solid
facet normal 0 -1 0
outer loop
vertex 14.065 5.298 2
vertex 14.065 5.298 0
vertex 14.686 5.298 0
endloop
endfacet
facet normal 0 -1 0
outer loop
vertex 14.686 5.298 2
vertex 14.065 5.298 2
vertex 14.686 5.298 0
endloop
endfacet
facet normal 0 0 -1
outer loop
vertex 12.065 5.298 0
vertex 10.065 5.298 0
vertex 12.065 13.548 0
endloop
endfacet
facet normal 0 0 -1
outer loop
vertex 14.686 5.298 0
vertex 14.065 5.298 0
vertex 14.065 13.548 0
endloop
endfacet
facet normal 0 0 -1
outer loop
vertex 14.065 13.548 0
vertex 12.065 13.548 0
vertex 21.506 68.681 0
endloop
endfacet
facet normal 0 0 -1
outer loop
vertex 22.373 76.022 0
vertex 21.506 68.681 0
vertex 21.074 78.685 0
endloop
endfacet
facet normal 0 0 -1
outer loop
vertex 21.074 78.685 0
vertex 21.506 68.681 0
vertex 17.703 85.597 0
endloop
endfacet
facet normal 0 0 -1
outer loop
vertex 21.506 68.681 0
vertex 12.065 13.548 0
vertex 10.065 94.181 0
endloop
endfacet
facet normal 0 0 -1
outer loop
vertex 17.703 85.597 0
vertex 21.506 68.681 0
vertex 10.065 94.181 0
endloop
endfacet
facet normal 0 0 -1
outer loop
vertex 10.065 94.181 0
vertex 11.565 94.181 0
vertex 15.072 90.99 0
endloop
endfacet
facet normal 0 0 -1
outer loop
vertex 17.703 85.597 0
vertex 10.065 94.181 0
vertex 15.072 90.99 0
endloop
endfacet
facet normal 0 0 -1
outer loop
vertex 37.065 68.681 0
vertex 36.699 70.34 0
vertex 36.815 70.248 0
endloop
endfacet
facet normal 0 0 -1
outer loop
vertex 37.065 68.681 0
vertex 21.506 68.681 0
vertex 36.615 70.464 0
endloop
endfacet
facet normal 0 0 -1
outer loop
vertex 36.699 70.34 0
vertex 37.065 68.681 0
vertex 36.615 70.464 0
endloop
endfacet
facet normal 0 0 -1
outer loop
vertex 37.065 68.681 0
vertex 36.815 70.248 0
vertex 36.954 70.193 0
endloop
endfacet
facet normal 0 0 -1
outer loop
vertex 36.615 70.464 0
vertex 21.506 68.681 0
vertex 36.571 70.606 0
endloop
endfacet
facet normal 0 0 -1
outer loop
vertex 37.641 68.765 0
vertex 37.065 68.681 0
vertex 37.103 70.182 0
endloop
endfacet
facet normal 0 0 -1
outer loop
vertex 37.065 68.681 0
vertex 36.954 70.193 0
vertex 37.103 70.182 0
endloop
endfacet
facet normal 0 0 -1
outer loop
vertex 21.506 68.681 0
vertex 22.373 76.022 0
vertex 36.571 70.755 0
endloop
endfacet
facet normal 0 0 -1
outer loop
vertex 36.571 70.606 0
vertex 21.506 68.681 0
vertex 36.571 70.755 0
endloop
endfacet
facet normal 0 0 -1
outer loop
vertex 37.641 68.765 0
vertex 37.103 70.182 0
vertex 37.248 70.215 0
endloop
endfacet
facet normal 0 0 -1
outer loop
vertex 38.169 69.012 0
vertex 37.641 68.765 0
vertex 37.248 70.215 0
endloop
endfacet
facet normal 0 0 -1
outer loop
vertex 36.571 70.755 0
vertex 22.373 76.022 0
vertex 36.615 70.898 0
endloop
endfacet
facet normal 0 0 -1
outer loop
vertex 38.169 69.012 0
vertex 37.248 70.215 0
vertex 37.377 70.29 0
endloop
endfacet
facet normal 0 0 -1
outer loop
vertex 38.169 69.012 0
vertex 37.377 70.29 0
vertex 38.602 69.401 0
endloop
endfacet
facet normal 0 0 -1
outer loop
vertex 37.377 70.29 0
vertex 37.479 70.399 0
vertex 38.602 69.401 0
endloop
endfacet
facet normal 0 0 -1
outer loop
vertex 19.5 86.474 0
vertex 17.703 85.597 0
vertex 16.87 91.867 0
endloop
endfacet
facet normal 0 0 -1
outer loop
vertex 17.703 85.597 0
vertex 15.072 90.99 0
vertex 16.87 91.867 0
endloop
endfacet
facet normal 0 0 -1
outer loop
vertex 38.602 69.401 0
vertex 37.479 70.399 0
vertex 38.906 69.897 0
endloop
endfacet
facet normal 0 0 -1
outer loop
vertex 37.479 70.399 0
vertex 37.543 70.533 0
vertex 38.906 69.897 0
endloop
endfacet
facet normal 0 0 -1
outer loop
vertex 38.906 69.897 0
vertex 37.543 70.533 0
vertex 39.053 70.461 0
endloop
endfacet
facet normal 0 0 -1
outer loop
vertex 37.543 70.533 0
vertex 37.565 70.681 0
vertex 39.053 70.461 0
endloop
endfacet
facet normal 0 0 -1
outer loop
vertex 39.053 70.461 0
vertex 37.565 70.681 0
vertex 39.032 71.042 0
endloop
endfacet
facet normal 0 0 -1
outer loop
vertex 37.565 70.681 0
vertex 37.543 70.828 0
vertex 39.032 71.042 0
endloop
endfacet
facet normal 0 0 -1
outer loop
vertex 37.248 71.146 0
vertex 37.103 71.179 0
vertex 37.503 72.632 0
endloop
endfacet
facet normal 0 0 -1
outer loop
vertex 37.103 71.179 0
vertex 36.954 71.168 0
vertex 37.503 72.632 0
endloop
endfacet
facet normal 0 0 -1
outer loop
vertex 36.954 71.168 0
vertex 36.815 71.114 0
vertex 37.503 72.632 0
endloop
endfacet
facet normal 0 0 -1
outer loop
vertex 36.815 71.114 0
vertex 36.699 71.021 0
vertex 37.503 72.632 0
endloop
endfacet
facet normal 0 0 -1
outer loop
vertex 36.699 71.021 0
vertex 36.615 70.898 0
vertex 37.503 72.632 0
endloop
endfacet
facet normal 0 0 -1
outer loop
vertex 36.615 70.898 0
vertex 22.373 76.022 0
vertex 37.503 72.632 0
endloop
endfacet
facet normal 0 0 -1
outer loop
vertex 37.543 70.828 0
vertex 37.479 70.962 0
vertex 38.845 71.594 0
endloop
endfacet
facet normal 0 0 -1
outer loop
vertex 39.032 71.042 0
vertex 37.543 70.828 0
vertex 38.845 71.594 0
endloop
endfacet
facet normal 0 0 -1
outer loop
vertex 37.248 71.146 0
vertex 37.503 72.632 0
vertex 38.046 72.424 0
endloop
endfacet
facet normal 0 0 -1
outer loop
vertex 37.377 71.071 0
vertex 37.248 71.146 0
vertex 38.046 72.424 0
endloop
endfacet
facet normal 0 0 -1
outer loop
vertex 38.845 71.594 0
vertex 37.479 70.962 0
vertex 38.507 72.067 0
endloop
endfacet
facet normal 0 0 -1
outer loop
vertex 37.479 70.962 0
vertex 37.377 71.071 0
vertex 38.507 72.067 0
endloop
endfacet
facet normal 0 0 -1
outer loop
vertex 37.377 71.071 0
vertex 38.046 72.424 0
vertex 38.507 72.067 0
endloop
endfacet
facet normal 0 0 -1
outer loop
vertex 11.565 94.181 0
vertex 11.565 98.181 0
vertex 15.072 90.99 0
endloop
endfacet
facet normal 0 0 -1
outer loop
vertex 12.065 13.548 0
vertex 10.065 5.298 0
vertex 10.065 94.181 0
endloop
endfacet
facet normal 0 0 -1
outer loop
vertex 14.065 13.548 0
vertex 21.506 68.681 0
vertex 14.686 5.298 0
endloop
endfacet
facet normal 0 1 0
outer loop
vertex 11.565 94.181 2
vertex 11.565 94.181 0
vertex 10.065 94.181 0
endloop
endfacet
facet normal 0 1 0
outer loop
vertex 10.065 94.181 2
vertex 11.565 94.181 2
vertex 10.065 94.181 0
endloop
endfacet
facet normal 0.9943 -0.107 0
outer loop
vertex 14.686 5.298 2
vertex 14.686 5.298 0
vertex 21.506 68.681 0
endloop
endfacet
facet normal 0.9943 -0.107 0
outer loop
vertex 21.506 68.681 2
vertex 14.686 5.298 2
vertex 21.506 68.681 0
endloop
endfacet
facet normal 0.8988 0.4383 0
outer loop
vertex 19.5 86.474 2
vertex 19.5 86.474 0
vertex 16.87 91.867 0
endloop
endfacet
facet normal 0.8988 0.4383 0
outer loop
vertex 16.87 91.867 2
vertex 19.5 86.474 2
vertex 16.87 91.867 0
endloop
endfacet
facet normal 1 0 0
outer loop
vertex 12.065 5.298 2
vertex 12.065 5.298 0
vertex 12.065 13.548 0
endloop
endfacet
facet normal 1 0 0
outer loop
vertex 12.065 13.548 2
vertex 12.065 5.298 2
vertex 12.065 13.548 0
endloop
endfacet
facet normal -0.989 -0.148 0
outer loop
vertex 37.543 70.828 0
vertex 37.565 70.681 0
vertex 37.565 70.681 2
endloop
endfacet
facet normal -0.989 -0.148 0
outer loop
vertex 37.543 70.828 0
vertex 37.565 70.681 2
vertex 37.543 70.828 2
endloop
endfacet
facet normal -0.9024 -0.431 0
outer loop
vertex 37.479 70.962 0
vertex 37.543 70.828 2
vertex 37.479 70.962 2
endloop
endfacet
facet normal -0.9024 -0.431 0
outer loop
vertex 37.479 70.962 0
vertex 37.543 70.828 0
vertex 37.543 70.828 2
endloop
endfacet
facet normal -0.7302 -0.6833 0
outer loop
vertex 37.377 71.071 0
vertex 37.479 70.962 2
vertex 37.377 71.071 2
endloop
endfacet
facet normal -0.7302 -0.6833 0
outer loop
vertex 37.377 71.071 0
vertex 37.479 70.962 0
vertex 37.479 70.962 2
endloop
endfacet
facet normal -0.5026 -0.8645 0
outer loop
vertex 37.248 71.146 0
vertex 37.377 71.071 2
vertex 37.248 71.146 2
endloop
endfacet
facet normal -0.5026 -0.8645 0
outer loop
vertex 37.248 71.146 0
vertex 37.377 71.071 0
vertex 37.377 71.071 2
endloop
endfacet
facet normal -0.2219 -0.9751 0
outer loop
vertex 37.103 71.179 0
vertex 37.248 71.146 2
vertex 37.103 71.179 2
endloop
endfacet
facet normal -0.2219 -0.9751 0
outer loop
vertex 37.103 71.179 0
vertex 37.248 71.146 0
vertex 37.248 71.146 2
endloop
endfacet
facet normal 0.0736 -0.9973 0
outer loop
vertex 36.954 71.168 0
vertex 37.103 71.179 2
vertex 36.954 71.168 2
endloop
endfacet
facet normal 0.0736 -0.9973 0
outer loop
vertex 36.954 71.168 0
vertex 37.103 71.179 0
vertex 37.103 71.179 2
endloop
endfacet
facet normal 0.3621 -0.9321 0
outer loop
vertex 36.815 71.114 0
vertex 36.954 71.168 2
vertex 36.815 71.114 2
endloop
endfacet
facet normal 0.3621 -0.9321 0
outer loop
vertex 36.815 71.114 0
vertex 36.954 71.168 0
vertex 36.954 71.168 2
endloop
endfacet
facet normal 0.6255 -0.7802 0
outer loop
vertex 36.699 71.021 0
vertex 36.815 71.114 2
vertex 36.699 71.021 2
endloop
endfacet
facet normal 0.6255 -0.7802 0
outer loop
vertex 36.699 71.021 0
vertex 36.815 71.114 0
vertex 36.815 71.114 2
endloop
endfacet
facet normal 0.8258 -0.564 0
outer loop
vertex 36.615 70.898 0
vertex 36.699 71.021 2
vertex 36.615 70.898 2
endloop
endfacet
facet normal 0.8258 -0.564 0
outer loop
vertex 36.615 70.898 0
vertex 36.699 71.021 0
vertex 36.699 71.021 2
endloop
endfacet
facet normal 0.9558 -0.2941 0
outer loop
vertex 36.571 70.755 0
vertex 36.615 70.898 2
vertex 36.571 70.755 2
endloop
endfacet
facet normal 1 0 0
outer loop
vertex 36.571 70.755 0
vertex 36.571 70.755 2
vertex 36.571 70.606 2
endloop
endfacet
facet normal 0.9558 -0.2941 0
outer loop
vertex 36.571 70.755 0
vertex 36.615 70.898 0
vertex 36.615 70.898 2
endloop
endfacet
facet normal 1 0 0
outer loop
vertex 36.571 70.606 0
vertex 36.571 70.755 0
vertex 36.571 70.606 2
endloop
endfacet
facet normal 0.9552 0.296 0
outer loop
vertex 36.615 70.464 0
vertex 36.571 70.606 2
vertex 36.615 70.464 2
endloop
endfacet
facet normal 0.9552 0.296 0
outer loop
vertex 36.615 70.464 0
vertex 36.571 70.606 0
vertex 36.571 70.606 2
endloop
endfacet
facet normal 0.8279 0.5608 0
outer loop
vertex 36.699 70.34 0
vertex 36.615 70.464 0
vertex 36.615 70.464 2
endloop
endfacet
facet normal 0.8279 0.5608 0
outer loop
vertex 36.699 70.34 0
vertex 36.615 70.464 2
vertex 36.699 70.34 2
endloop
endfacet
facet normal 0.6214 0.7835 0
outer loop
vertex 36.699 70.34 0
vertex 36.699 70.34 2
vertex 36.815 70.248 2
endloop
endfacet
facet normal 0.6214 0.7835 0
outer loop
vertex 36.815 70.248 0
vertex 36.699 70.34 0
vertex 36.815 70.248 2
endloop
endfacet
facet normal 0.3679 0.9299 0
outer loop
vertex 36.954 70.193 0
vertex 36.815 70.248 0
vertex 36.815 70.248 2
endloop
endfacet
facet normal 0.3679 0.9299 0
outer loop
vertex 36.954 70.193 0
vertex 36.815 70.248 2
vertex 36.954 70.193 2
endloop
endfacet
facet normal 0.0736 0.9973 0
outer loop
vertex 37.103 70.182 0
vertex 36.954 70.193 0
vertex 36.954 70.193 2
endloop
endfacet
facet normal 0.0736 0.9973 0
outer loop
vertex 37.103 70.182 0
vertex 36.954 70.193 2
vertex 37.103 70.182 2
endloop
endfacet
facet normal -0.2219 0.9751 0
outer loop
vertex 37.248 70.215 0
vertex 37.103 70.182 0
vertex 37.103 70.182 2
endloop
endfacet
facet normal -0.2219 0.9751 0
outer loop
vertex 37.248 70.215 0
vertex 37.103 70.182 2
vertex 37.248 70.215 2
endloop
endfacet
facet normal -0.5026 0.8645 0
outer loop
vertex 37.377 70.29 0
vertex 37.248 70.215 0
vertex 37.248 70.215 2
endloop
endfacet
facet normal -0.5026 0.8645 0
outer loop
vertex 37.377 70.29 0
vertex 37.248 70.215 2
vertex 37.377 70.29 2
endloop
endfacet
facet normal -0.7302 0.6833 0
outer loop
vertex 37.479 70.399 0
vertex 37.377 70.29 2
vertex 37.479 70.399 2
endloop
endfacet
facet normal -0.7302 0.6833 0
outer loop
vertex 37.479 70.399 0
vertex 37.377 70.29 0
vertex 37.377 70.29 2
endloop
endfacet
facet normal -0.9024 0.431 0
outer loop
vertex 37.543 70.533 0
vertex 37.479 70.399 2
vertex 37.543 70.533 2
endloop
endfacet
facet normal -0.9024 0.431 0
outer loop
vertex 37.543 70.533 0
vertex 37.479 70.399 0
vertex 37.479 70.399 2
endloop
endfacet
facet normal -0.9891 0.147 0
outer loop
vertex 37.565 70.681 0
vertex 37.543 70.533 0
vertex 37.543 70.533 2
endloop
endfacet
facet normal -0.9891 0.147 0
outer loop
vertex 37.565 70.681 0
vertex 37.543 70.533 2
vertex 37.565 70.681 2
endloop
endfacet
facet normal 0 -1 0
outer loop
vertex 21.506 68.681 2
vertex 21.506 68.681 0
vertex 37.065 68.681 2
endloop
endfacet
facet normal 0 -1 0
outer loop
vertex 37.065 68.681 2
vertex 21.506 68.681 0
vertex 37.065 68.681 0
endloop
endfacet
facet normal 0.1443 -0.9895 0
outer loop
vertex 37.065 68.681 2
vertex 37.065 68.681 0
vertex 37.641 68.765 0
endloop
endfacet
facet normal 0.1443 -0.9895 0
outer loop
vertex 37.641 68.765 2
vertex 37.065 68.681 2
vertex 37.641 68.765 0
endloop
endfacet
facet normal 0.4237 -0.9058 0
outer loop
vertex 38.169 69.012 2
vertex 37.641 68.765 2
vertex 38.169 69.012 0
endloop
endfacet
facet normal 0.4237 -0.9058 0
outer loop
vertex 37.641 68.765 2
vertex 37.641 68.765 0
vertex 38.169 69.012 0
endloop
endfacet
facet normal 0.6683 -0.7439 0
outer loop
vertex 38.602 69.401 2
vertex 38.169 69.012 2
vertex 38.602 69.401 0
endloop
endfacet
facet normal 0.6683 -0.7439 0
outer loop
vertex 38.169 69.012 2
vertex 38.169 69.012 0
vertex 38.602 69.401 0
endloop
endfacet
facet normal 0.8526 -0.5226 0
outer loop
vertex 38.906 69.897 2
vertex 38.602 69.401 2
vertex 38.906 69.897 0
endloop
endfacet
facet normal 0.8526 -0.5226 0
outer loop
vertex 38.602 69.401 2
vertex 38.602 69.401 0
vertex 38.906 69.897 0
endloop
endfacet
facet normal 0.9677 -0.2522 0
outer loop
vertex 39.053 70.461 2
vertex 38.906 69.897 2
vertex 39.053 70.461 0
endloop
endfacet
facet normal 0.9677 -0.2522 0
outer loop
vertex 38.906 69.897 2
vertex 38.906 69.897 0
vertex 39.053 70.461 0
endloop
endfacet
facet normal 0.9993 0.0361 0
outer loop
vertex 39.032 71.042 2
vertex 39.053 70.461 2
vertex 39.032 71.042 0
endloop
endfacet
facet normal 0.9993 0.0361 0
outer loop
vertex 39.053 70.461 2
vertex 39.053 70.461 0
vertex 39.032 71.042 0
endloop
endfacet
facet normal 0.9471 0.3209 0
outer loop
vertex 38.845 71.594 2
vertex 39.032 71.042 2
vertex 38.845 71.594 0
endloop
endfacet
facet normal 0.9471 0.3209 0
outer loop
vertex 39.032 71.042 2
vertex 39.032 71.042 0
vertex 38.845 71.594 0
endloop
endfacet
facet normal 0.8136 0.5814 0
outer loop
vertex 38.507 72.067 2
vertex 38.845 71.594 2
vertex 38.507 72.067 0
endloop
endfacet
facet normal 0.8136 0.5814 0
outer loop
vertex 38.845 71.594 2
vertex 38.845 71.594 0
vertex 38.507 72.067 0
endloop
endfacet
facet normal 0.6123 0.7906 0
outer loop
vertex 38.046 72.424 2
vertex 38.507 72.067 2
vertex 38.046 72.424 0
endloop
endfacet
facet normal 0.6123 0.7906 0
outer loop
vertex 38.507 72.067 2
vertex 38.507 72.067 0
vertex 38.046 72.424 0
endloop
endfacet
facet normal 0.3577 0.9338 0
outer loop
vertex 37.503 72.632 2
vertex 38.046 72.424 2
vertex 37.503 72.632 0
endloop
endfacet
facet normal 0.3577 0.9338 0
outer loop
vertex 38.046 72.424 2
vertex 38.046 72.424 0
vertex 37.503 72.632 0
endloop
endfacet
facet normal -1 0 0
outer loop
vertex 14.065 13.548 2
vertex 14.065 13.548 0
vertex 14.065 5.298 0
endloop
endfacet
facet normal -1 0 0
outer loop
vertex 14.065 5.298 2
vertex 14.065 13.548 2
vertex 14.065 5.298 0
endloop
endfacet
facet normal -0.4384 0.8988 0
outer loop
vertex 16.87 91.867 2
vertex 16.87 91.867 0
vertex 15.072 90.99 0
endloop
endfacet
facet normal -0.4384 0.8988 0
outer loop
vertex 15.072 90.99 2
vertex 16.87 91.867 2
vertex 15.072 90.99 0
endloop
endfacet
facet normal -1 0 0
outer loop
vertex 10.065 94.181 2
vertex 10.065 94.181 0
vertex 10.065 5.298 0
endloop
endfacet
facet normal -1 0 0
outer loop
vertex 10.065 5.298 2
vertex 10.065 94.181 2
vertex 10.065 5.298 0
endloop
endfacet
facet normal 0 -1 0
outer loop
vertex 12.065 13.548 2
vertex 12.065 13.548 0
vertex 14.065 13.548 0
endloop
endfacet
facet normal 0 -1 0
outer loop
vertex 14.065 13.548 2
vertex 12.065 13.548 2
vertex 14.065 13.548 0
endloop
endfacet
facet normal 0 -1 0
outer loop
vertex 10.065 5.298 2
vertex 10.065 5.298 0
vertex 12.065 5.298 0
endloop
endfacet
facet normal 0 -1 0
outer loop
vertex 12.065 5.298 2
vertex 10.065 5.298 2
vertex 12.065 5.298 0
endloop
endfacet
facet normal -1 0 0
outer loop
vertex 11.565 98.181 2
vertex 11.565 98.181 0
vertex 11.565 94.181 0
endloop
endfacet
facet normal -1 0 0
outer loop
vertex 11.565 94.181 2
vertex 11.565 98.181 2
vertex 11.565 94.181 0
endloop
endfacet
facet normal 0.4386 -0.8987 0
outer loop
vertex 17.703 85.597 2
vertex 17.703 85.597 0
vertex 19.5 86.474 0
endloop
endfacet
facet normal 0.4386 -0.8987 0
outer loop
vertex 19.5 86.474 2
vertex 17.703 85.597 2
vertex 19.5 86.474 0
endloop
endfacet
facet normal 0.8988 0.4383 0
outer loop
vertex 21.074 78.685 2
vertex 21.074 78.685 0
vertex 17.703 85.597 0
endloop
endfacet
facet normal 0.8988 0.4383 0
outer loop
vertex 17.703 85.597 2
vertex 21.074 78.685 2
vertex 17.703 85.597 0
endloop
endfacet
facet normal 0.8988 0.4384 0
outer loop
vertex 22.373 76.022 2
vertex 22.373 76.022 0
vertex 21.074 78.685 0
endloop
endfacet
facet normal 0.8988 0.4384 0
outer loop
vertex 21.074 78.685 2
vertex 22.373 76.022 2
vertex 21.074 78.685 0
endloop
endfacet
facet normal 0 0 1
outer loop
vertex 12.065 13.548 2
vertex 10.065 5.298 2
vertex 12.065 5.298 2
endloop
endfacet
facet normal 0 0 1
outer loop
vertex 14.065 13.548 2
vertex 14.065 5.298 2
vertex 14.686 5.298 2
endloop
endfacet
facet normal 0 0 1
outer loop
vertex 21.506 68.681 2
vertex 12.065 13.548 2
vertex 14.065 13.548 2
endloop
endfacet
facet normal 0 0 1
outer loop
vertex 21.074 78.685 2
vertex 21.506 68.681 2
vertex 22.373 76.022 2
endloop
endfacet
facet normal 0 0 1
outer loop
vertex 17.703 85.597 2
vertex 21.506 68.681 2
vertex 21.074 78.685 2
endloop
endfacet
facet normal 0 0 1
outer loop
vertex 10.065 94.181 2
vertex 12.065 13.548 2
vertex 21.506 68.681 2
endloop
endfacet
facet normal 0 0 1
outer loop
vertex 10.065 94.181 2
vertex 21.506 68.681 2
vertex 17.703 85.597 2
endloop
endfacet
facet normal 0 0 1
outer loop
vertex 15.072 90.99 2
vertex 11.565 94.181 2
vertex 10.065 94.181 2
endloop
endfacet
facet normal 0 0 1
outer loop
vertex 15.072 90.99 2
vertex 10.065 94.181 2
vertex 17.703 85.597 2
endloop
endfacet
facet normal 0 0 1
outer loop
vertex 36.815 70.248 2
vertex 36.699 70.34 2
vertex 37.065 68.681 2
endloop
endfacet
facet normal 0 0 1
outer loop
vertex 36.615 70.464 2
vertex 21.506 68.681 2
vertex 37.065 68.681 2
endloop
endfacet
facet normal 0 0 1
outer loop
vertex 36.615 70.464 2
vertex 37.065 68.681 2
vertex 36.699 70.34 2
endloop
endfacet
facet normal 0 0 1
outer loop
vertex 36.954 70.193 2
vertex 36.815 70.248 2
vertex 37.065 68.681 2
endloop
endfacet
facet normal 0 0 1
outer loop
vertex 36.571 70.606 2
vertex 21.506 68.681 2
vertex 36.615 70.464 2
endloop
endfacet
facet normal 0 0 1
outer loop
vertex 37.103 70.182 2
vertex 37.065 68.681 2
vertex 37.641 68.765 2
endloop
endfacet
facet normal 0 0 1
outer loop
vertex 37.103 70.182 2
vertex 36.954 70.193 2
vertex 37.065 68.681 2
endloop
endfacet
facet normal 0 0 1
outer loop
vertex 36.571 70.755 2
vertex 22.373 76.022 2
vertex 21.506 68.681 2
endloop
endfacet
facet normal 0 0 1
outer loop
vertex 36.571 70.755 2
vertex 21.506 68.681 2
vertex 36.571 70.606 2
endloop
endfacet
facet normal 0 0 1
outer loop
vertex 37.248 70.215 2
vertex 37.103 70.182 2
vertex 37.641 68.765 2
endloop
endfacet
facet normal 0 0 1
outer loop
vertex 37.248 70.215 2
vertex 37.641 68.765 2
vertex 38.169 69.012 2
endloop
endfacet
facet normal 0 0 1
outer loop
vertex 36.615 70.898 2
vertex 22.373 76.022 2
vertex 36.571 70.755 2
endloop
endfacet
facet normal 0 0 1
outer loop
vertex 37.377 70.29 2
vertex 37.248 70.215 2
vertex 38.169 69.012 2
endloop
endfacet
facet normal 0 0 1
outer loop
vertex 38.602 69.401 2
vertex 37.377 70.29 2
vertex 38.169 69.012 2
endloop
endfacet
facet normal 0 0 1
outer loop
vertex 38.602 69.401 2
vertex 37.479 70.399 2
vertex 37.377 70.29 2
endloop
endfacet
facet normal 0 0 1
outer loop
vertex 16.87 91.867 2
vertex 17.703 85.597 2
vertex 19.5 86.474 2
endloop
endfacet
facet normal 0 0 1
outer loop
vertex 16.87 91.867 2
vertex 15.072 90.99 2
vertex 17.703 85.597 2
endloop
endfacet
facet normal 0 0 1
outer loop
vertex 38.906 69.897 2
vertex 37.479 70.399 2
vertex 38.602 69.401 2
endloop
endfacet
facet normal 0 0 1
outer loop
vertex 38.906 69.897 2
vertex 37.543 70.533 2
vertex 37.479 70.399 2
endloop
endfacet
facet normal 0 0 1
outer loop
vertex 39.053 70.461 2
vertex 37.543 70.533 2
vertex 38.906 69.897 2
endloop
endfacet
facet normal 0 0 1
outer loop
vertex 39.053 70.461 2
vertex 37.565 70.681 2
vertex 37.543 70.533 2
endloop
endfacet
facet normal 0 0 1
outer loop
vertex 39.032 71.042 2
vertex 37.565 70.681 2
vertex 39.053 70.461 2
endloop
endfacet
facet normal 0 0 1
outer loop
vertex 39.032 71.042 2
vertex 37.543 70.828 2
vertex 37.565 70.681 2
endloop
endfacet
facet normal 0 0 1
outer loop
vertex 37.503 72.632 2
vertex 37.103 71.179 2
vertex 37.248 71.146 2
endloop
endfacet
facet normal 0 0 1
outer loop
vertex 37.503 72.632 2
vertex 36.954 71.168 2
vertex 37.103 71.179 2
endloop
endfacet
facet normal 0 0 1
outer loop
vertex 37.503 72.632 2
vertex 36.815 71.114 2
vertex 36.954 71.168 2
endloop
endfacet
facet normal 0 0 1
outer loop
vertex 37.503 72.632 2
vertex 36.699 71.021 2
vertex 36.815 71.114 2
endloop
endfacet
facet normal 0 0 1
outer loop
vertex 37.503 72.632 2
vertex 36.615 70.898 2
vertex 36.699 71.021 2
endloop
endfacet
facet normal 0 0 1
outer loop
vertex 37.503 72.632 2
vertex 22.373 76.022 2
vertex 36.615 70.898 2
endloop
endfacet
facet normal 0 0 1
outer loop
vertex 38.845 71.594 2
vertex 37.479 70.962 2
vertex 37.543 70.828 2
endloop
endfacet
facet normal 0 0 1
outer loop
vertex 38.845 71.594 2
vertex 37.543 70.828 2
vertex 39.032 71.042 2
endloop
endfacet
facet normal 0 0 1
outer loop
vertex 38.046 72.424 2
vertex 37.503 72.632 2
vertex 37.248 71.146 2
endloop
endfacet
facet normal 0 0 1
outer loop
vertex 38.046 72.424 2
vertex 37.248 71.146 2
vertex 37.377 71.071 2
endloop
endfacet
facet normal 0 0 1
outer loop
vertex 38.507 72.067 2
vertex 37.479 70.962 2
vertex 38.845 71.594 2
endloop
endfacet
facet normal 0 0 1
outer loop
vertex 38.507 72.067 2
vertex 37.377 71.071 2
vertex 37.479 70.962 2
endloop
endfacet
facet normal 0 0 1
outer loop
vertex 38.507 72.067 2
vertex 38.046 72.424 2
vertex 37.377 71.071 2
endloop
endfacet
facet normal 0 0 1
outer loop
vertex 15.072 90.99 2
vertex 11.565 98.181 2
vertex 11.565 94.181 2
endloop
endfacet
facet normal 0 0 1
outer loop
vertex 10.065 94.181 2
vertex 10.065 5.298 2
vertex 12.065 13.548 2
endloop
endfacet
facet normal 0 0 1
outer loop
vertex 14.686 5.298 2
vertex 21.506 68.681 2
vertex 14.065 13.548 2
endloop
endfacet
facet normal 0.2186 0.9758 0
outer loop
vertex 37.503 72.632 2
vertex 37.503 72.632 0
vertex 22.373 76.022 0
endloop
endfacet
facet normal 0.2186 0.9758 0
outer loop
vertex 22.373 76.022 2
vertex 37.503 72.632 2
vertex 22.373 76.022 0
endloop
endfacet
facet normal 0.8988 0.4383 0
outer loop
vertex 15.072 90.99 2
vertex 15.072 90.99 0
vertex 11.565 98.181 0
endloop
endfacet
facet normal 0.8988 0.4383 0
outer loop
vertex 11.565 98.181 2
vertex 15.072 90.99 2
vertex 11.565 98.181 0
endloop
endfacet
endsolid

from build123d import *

# Parameters (mm, degrees)
SKETCH_1_R      = 0.5
EXTRUDE_1_DEPTH = 2


with BuildPart() as part:
    # 草图1 → 凸台-拉伸1 (new body)
    with BuildSketch(Plane.XY):
        with BuildLine():
            Line((15.072355278, 90.9902121), (11.565386103, 98.180564471))
            Line((11.565386103, 98.180564471), (11.565386103, 94.180564471))
            Line((11.565386103, 94.180564471), (10.065386103, 94.180564471))
            Line((10.065386103, 94.180564471), (10.065386103, 5.297847711))
            Line((10.065386103, 5.297847711), (12.065386103, 5.297847711))
            Line((12.065386103, 5.297847711), (12.065386103, 13.547847711))
            Line((12.065386103, 13.547847711), (14.065386103, 13.547847711))
            Line((14.065386103, 13.547847711), (14.065386103, 5.297847711))
            Line((14.065386103, 5.297847711), (14.686363295, 5.297847711))
            Line((14.686363295, 5.297847711), (21.506195844, 68.680564471))
            Line((21.506195844, 68.680564471), (37.065386103, 68.680564471))
            ThreePointArc((37.065386103, 68.680564471), (39.053255495, 70.460620657), (37.502605679, 72.632189189))
            Line((37.502605679, 72.632189189), (22.373010944, 76.021649743))
            Line((22.373010944, 76.021649743), (21.07399479, 78.685027553))
            Line((21.07399479, 78.685027553), (17.702582158, 85.597447823))
            Line((17.702582158, 85.597447823), (19.500170251, 86.474190116))
            Line((19.500170251, 86.474190116), (16.86994337, 91.866954394))
            Line((16.86994337, 91.866954394), (15.072355278, 90.9902121))
        make_face()
        with Locations((37.065386103, 70.680564471)):
            Circle(SKETCH_1_R, mode=Mode.SUBTRACT)
    extrude(amount=EXTRUDE_1_DEPTH)


solid = part.part
